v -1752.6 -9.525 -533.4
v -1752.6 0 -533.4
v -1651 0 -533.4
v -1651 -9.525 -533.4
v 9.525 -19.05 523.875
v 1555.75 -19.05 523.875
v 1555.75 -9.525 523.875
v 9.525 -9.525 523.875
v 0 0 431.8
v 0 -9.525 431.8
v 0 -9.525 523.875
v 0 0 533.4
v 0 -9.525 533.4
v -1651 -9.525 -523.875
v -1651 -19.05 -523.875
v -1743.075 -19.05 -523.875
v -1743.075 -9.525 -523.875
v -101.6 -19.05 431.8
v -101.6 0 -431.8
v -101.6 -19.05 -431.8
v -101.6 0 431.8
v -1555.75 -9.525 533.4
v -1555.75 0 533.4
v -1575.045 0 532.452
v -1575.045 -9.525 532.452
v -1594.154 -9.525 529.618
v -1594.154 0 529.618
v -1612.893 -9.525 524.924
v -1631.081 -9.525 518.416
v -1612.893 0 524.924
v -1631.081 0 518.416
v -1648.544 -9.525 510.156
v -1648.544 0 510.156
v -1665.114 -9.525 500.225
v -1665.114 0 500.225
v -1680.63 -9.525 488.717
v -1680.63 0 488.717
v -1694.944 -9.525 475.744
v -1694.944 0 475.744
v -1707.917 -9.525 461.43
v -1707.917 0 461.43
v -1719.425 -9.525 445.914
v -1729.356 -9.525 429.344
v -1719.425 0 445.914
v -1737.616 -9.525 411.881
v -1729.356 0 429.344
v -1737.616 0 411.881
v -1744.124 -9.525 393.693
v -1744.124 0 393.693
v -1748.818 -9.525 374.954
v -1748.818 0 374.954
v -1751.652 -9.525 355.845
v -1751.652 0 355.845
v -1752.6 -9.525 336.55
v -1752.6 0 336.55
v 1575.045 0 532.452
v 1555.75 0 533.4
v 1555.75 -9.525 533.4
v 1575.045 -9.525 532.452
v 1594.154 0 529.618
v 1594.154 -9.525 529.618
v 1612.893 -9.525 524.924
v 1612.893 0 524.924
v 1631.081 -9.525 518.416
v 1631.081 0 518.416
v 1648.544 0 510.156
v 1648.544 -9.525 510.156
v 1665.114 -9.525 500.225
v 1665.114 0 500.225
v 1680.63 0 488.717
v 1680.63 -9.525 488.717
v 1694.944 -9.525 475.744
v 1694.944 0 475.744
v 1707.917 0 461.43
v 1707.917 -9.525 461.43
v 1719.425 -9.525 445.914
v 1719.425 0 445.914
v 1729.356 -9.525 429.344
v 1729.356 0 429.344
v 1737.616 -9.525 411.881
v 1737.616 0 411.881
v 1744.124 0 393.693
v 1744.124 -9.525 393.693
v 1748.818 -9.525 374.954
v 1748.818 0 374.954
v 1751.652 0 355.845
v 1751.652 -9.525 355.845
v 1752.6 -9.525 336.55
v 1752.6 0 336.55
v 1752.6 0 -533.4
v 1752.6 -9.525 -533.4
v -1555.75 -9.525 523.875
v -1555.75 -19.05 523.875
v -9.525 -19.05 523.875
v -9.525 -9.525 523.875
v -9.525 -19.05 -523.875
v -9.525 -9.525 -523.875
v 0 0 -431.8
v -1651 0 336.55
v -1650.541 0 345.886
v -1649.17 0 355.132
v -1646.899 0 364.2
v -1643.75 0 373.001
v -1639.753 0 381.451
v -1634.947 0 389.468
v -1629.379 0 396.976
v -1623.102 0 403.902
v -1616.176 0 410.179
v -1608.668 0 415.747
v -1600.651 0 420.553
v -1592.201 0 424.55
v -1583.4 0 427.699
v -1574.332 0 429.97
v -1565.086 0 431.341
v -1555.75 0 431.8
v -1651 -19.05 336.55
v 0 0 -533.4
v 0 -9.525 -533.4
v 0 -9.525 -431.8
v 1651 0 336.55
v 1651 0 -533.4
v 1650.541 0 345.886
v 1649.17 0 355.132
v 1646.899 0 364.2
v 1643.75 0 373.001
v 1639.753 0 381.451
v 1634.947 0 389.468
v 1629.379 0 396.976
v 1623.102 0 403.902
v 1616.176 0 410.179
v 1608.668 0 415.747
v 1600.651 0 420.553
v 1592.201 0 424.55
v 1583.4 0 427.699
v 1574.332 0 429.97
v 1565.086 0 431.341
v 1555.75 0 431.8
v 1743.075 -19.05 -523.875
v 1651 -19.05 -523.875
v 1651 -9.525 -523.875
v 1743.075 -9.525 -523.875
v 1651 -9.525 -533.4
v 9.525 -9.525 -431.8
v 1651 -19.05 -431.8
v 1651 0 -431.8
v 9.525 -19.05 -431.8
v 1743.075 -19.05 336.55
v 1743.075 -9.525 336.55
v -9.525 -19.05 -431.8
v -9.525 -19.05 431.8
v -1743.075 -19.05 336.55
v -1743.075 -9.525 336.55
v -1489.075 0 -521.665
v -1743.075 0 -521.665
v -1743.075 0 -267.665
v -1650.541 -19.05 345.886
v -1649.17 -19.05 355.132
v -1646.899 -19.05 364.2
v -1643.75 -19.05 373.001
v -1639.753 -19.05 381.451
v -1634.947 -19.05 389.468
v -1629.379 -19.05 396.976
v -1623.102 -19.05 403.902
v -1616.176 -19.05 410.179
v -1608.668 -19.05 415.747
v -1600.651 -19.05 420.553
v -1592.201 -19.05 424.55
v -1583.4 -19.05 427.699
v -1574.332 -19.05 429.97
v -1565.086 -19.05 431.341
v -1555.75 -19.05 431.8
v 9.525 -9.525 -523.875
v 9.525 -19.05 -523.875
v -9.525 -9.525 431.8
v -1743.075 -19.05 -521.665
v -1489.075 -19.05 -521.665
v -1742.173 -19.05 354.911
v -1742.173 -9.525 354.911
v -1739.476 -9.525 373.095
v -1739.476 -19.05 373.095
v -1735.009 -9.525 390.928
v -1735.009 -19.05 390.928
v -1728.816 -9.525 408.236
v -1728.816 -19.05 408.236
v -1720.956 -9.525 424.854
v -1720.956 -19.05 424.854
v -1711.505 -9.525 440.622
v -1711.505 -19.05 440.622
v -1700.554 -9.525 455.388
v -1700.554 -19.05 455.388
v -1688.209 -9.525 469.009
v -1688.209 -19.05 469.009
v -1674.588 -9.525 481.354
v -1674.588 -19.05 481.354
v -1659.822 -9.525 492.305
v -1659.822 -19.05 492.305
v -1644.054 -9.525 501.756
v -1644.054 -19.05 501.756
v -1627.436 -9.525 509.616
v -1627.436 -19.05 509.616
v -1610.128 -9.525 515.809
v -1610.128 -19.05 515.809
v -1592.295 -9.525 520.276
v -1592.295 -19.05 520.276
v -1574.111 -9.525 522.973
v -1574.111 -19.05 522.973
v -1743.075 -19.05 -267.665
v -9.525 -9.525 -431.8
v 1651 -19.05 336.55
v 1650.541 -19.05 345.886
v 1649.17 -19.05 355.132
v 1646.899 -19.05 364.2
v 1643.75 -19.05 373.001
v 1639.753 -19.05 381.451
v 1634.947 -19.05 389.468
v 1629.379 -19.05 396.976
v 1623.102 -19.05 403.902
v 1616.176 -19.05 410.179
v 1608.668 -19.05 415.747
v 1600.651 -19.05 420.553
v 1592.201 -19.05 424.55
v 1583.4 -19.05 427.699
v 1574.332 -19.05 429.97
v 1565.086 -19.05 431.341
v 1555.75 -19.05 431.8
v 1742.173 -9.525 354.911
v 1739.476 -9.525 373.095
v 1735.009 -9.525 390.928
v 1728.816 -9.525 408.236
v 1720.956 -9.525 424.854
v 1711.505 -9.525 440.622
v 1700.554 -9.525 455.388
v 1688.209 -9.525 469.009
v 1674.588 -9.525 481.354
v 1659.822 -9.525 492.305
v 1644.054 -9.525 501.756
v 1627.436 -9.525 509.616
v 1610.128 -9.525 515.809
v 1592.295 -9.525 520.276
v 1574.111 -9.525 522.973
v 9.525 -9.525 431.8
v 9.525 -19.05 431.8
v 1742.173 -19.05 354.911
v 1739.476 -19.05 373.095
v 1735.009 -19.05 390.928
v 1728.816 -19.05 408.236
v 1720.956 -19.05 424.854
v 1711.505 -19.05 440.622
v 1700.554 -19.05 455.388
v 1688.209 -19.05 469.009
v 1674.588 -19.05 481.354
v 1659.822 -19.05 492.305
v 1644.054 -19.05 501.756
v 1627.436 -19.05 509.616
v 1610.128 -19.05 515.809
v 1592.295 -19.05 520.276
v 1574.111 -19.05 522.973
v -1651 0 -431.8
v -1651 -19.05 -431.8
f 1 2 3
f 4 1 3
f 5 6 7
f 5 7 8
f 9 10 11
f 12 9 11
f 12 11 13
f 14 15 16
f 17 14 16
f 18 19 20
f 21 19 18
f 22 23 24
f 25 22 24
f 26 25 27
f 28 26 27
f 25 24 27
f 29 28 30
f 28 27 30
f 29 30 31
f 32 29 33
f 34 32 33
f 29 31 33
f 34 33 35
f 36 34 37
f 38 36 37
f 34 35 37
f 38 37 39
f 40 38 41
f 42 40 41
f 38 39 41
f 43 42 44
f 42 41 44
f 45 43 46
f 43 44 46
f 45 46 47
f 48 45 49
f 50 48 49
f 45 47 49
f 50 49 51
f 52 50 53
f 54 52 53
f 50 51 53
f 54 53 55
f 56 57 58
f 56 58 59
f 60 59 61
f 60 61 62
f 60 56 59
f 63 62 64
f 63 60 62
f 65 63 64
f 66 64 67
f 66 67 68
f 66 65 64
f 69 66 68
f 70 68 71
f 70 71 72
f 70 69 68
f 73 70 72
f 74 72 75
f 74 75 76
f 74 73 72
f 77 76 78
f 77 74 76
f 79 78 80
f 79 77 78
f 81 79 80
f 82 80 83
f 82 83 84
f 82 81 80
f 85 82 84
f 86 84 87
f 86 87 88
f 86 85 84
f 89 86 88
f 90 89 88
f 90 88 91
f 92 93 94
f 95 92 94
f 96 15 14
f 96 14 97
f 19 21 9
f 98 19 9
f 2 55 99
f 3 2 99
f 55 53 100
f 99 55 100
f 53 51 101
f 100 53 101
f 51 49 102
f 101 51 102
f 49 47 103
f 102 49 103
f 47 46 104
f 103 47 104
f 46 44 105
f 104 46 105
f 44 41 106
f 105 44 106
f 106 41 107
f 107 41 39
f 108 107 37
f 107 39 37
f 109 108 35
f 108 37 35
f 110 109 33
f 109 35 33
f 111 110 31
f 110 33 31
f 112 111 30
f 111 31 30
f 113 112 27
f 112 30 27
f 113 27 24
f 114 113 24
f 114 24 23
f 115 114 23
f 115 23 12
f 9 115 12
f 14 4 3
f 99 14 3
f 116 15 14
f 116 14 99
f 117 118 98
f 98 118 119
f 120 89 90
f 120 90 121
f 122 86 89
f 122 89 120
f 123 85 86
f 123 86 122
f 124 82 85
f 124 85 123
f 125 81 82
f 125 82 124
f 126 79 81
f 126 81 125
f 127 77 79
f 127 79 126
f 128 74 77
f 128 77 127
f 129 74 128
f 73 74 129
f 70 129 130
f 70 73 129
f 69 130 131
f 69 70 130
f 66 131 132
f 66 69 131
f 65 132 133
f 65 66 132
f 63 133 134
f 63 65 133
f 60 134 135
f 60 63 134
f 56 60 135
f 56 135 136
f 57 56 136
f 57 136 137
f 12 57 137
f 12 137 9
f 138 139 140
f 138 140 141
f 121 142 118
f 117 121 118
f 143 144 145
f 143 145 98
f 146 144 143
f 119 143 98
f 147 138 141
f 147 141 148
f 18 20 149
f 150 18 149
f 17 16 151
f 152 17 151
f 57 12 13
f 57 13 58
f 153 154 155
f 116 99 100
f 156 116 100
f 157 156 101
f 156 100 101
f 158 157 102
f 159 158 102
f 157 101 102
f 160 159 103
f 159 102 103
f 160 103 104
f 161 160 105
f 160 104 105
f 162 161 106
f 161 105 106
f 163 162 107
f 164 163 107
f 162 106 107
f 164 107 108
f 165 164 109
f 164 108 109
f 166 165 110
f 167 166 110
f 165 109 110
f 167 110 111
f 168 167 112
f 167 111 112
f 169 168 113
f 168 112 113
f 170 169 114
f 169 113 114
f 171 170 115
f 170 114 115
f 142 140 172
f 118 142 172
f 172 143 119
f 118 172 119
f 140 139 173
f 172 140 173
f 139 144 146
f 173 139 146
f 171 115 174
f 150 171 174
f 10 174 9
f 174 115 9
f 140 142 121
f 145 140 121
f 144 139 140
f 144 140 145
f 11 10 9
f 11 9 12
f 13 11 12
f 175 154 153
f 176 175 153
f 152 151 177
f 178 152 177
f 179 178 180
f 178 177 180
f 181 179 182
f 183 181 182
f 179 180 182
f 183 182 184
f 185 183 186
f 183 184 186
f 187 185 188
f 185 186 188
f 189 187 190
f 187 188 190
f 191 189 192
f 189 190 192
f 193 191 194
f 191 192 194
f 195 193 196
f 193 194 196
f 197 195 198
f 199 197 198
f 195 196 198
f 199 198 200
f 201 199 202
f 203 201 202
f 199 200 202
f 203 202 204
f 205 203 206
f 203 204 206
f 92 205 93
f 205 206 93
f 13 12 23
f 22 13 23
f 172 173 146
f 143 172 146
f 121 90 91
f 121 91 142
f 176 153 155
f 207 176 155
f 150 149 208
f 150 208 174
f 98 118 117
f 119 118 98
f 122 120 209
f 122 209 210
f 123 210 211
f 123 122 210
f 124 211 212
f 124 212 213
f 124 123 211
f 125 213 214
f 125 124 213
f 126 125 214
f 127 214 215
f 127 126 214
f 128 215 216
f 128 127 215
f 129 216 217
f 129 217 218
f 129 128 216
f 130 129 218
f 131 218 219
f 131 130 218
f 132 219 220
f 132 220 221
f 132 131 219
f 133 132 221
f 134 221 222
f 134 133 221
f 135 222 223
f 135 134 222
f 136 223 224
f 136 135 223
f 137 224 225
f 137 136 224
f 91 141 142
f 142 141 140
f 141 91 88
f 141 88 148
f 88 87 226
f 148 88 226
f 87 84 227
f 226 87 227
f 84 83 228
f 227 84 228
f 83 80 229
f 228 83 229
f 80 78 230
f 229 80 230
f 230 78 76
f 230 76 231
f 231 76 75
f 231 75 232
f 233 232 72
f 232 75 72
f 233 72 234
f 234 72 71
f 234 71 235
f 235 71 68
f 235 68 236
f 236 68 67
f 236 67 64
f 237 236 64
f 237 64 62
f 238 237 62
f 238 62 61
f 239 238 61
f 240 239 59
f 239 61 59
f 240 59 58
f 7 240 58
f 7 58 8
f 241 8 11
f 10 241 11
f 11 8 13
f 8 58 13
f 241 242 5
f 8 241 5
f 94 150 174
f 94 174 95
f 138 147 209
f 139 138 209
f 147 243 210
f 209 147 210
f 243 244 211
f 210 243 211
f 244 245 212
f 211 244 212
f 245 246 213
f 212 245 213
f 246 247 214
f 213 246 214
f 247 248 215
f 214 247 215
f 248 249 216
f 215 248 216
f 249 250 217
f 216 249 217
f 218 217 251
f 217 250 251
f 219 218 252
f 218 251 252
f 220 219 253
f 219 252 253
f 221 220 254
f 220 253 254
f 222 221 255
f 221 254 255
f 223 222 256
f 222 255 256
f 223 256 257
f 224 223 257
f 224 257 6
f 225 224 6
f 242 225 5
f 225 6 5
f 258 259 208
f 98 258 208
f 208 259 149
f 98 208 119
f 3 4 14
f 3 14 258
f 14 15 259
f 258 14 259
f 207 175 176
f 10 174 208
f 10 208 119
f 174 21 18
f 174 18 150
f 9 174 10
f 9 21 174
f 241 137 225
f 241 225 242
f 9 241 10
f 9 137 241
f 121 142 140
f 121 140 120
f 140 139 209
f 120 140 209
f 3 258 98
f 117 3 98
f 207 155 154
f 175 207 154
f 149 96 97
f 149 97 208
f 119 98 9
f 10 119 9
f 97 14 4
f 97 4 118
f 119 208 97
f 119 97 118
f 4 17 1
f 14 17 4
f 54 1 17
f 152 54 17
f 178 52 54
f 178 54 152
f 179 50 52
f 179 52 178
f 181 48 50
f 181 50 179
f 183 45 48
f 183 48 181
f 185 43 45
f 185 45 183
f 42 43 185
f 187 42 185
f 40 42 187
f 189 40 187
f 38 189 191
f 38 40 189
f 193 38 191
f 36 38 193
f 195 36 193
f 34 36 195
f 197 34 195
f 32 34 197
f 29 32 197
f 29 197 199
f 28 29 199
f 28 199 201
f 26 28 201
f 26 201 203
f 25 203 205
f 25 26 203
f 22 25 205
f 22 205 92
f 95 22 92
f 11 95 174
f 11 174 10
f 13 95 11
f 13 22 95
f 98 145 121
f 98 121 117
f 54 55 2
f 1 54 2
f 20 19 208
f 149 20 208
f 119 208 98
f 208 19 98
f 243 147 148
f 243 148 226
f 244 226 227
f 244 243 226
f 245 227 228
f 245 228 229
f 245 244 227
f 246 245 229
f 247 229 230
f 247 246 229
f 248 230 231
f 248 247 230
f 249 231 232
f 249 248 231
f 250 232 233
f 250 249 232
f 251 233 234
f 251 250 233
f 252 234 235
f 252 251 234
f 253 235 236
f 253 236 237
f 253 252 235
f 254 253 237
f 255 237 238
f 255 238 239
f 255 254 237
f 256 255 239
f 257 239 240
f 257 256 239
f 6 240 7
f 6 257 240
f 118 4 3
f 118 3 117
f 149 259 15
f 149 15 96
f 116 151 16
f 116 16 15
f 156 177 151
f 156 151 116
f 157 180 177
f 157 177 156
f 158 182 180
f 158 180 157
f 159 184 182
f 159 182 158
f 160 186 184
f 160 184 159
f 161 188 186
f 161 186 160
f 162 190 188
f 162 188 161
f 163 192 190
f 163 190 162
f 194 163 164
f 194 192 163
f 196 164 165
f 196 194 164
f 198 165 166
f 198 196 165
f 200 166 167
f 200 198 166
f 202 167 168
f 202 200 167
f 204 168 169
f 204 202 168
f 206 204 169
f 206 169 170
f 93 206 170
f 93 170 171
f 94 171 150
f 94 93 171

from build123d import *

# Parameters (mm, degrees)
F1_DEPTH  = 19.05
F3_W      = 1651
F3_H      = 194.611281
F4_DEPTH  = 19.051
F6_DEPTH  = 9.525
F7_W      = 1845.029831
F7_H      = 1326.859474
F8_DEPTH  = 19.051
F10_W     = 1651
F10_H     = 101.6
F11_DEPTH = 19.05
F12_W     = 1651
F12_H     = 9.525
F13_DEPTH = 9.525
F14_W     = 9.525
F14_H     = 92.075
F15_DEPTH = 9.525
F16_W     = 9.525
F16_H     = 92.075
F17_DEPTH = 9.525
F18_W     = 101.6
F18_H     = 863.6
F19_DEPTH = 19.05
F20_W     = 9.525
F20_H     = 863.6
F21_DEPTH = 9.525
F24_DEPTH = 19.05


with BuildPart() as f1:
    # F0 (on Front) → F1 (new body)
    with BuildSketch(Plane.XZ):
        with BuildLine():
            Line((-1752.6, -533.4), (1752.6, -533.4))
            Line((1752.6, -533.4), (1752.6, 336.55))
            ThreePointArc((1752.6, 336.55), (1694.94397, 475.74397), (1555.75, 533.4))
            Line((1555.75, 533.4), (-1555.75, 533.4))
            ThreePointArc((-1555.75, 533.4), (-1694.94397, 475.74397), (-1752.6, 336.55))
            Line((-1752.6, 336.55), (-1752.6, -533.4))
        make_face()
        with BuildLine():
            ThreePointArc((1555.75, 431.8), (1623.101921, 403.901921), (1651, 336.55))
            Line((1651, 336.55), (1651, -431.8))
            Line((1651, -431.8), (-1651, -431.8))
            Line((-1651, -431.8), (-1651, 336.55))
            ThreePointArc((-1651, 336.55), (-1623.101921, 403.901921), (-1555.75, 431.8))
            Line((-1555.75, 431.8), (1555.75, 431.8))
        make_face(mode=Mode.SUBTRACT)
    extrude(amount=F1_DEPTH)

    # F3 (on face) → F4 (cut, through all)
    with BuildSketch(Plane.XZ.offset(19.05)):
        with Locations((-825.5, -493.085877)):
            Rectangle(F3_W, F3_H)
    extrude(amount=-F4_DEPTH, mode=Mode.SUBTRACT)

    # F5 (on face) → F6 (cut)
    with BuildSketch(Plane.XZ.offset(19.05)):
        with BuildLine():
            Line((-1651, -523.875), (-1743.075, -523.875))
            Line((-1743.075, -523.875), (-1743.075, 336.55))
            ThreePointArc((-1743.075, 336.55), (-1688.208778, 469.008778), (-1555.75, 523.875))
            Line((-1555.75, 523.875), (161.150128, 523.875))
            Line((161.150128, 523.875), (161.150128, 533.4))
            Line((161.150128, 533.4), (-1555.75, 533.4))
            ThreePointArc((-1555.75, 533.4), (-1694.94397, 475.74397), (-1752.6, 336.55))
            Line((-1752.6, 336.55), (-1752.6, -533.4))
            Line((-1752.6, -533.4), (-1743.075, -533.4))
            Line((-1743.075, -533.4), (-1651, -533.4))
            Line((-1651, -533.4), (-1651, -523.875))
        make_face()
    extrude(amount=-F6_DEPTH, mode=Mode.SUBTRACT)

    # F7 (on face) → F8 (cut, through all)
    with BuildSketch(Plane.XZ.offset(19.05)):
        with Locations((922.514915, -28.048873)):
            Rectangle(F7_W, F7_H)
    extrude(amount=-F8_DEPTH, mode=Mode.SUBTRACT)

    # F14 (on face) → F15 (cut)
    with BuildSketch(Plane.XZ.offset(19.05)):
        with Locations((-4.7625, 477.8375)):
            Rectangle(F14_W, F14_H)
    extrude(amount=-F15_DEPTH, mode=Mode.SUBTRACT)


with BuildPart() as f11:
    # F10 (on face) → F11 (new body)
    with BuildSketch(Plane.XZ.offset(19.05)):
        with Locations((-825.5, -482.6)):
            Rectangle(F10_W, F10_H)
    extrude(amount=-F11_DEPTH)

    # F12 (on face) → F13 (cut)
    with BuildSketch(Plane.XZ.offset(19.05)):
        with Locations((-825.5, -528.6375)):
            Rectangle(F12_W, F12_H)
    extrude(amount=-F13_DEPTH, mode=Mode.SUBTRACT)

    # F16 (on face) → F17 (cut)
    with BuildSketch(Plane.XZ.offset(19.05)):
        with Locations((-4.7625, -477.8375)):
            Rectangle(F16_W, F16_H)
    extrude(amount=-F17_DEPTH, mode=Mode.SUBTRACT)


with BuildPart() as f19:
    # F18 (on Front) → F19 (new body)
    with BuildSketch(Plane.XZ):
        with Locations((-50.8, 0)):
            Rectangle(F18_W, F18_H)
    extrude(amount=F19_DEPTH)

    # F20 (on face) → F21 (cut)
    with BuildSketch(Plane.XZ.offset(19.05)):
        with Locations((-4.7625, 0)):
            Rectangle(F20_W, F20_H)
    extrude(amount=-F21_DEPTH, mode=Mode.SUBTRACT)


with BuildPart() as f22_1:
    # F22: instance of F1
    add(f1.part.mirror(Plane.YZ))


with BuildPart() as f24:
    # F23 (on Front) → F24 (new body)
    with BuildSketch(Plane.XZ):
        Polygon((-1489.075, -521.664971), (-1743.075, -267.664971), (-1743.075, -521.664971), align=None)
    extrude(amount=F24_DEPTH)


with BuildPart() as f25_1:
    # F25: instance of F11
    add(f11.part.mirror(Plane.YZ))


solid = Compound([f1.part, f11.part, f19.part, f22_1.part, f24.part, f25_1.part])
